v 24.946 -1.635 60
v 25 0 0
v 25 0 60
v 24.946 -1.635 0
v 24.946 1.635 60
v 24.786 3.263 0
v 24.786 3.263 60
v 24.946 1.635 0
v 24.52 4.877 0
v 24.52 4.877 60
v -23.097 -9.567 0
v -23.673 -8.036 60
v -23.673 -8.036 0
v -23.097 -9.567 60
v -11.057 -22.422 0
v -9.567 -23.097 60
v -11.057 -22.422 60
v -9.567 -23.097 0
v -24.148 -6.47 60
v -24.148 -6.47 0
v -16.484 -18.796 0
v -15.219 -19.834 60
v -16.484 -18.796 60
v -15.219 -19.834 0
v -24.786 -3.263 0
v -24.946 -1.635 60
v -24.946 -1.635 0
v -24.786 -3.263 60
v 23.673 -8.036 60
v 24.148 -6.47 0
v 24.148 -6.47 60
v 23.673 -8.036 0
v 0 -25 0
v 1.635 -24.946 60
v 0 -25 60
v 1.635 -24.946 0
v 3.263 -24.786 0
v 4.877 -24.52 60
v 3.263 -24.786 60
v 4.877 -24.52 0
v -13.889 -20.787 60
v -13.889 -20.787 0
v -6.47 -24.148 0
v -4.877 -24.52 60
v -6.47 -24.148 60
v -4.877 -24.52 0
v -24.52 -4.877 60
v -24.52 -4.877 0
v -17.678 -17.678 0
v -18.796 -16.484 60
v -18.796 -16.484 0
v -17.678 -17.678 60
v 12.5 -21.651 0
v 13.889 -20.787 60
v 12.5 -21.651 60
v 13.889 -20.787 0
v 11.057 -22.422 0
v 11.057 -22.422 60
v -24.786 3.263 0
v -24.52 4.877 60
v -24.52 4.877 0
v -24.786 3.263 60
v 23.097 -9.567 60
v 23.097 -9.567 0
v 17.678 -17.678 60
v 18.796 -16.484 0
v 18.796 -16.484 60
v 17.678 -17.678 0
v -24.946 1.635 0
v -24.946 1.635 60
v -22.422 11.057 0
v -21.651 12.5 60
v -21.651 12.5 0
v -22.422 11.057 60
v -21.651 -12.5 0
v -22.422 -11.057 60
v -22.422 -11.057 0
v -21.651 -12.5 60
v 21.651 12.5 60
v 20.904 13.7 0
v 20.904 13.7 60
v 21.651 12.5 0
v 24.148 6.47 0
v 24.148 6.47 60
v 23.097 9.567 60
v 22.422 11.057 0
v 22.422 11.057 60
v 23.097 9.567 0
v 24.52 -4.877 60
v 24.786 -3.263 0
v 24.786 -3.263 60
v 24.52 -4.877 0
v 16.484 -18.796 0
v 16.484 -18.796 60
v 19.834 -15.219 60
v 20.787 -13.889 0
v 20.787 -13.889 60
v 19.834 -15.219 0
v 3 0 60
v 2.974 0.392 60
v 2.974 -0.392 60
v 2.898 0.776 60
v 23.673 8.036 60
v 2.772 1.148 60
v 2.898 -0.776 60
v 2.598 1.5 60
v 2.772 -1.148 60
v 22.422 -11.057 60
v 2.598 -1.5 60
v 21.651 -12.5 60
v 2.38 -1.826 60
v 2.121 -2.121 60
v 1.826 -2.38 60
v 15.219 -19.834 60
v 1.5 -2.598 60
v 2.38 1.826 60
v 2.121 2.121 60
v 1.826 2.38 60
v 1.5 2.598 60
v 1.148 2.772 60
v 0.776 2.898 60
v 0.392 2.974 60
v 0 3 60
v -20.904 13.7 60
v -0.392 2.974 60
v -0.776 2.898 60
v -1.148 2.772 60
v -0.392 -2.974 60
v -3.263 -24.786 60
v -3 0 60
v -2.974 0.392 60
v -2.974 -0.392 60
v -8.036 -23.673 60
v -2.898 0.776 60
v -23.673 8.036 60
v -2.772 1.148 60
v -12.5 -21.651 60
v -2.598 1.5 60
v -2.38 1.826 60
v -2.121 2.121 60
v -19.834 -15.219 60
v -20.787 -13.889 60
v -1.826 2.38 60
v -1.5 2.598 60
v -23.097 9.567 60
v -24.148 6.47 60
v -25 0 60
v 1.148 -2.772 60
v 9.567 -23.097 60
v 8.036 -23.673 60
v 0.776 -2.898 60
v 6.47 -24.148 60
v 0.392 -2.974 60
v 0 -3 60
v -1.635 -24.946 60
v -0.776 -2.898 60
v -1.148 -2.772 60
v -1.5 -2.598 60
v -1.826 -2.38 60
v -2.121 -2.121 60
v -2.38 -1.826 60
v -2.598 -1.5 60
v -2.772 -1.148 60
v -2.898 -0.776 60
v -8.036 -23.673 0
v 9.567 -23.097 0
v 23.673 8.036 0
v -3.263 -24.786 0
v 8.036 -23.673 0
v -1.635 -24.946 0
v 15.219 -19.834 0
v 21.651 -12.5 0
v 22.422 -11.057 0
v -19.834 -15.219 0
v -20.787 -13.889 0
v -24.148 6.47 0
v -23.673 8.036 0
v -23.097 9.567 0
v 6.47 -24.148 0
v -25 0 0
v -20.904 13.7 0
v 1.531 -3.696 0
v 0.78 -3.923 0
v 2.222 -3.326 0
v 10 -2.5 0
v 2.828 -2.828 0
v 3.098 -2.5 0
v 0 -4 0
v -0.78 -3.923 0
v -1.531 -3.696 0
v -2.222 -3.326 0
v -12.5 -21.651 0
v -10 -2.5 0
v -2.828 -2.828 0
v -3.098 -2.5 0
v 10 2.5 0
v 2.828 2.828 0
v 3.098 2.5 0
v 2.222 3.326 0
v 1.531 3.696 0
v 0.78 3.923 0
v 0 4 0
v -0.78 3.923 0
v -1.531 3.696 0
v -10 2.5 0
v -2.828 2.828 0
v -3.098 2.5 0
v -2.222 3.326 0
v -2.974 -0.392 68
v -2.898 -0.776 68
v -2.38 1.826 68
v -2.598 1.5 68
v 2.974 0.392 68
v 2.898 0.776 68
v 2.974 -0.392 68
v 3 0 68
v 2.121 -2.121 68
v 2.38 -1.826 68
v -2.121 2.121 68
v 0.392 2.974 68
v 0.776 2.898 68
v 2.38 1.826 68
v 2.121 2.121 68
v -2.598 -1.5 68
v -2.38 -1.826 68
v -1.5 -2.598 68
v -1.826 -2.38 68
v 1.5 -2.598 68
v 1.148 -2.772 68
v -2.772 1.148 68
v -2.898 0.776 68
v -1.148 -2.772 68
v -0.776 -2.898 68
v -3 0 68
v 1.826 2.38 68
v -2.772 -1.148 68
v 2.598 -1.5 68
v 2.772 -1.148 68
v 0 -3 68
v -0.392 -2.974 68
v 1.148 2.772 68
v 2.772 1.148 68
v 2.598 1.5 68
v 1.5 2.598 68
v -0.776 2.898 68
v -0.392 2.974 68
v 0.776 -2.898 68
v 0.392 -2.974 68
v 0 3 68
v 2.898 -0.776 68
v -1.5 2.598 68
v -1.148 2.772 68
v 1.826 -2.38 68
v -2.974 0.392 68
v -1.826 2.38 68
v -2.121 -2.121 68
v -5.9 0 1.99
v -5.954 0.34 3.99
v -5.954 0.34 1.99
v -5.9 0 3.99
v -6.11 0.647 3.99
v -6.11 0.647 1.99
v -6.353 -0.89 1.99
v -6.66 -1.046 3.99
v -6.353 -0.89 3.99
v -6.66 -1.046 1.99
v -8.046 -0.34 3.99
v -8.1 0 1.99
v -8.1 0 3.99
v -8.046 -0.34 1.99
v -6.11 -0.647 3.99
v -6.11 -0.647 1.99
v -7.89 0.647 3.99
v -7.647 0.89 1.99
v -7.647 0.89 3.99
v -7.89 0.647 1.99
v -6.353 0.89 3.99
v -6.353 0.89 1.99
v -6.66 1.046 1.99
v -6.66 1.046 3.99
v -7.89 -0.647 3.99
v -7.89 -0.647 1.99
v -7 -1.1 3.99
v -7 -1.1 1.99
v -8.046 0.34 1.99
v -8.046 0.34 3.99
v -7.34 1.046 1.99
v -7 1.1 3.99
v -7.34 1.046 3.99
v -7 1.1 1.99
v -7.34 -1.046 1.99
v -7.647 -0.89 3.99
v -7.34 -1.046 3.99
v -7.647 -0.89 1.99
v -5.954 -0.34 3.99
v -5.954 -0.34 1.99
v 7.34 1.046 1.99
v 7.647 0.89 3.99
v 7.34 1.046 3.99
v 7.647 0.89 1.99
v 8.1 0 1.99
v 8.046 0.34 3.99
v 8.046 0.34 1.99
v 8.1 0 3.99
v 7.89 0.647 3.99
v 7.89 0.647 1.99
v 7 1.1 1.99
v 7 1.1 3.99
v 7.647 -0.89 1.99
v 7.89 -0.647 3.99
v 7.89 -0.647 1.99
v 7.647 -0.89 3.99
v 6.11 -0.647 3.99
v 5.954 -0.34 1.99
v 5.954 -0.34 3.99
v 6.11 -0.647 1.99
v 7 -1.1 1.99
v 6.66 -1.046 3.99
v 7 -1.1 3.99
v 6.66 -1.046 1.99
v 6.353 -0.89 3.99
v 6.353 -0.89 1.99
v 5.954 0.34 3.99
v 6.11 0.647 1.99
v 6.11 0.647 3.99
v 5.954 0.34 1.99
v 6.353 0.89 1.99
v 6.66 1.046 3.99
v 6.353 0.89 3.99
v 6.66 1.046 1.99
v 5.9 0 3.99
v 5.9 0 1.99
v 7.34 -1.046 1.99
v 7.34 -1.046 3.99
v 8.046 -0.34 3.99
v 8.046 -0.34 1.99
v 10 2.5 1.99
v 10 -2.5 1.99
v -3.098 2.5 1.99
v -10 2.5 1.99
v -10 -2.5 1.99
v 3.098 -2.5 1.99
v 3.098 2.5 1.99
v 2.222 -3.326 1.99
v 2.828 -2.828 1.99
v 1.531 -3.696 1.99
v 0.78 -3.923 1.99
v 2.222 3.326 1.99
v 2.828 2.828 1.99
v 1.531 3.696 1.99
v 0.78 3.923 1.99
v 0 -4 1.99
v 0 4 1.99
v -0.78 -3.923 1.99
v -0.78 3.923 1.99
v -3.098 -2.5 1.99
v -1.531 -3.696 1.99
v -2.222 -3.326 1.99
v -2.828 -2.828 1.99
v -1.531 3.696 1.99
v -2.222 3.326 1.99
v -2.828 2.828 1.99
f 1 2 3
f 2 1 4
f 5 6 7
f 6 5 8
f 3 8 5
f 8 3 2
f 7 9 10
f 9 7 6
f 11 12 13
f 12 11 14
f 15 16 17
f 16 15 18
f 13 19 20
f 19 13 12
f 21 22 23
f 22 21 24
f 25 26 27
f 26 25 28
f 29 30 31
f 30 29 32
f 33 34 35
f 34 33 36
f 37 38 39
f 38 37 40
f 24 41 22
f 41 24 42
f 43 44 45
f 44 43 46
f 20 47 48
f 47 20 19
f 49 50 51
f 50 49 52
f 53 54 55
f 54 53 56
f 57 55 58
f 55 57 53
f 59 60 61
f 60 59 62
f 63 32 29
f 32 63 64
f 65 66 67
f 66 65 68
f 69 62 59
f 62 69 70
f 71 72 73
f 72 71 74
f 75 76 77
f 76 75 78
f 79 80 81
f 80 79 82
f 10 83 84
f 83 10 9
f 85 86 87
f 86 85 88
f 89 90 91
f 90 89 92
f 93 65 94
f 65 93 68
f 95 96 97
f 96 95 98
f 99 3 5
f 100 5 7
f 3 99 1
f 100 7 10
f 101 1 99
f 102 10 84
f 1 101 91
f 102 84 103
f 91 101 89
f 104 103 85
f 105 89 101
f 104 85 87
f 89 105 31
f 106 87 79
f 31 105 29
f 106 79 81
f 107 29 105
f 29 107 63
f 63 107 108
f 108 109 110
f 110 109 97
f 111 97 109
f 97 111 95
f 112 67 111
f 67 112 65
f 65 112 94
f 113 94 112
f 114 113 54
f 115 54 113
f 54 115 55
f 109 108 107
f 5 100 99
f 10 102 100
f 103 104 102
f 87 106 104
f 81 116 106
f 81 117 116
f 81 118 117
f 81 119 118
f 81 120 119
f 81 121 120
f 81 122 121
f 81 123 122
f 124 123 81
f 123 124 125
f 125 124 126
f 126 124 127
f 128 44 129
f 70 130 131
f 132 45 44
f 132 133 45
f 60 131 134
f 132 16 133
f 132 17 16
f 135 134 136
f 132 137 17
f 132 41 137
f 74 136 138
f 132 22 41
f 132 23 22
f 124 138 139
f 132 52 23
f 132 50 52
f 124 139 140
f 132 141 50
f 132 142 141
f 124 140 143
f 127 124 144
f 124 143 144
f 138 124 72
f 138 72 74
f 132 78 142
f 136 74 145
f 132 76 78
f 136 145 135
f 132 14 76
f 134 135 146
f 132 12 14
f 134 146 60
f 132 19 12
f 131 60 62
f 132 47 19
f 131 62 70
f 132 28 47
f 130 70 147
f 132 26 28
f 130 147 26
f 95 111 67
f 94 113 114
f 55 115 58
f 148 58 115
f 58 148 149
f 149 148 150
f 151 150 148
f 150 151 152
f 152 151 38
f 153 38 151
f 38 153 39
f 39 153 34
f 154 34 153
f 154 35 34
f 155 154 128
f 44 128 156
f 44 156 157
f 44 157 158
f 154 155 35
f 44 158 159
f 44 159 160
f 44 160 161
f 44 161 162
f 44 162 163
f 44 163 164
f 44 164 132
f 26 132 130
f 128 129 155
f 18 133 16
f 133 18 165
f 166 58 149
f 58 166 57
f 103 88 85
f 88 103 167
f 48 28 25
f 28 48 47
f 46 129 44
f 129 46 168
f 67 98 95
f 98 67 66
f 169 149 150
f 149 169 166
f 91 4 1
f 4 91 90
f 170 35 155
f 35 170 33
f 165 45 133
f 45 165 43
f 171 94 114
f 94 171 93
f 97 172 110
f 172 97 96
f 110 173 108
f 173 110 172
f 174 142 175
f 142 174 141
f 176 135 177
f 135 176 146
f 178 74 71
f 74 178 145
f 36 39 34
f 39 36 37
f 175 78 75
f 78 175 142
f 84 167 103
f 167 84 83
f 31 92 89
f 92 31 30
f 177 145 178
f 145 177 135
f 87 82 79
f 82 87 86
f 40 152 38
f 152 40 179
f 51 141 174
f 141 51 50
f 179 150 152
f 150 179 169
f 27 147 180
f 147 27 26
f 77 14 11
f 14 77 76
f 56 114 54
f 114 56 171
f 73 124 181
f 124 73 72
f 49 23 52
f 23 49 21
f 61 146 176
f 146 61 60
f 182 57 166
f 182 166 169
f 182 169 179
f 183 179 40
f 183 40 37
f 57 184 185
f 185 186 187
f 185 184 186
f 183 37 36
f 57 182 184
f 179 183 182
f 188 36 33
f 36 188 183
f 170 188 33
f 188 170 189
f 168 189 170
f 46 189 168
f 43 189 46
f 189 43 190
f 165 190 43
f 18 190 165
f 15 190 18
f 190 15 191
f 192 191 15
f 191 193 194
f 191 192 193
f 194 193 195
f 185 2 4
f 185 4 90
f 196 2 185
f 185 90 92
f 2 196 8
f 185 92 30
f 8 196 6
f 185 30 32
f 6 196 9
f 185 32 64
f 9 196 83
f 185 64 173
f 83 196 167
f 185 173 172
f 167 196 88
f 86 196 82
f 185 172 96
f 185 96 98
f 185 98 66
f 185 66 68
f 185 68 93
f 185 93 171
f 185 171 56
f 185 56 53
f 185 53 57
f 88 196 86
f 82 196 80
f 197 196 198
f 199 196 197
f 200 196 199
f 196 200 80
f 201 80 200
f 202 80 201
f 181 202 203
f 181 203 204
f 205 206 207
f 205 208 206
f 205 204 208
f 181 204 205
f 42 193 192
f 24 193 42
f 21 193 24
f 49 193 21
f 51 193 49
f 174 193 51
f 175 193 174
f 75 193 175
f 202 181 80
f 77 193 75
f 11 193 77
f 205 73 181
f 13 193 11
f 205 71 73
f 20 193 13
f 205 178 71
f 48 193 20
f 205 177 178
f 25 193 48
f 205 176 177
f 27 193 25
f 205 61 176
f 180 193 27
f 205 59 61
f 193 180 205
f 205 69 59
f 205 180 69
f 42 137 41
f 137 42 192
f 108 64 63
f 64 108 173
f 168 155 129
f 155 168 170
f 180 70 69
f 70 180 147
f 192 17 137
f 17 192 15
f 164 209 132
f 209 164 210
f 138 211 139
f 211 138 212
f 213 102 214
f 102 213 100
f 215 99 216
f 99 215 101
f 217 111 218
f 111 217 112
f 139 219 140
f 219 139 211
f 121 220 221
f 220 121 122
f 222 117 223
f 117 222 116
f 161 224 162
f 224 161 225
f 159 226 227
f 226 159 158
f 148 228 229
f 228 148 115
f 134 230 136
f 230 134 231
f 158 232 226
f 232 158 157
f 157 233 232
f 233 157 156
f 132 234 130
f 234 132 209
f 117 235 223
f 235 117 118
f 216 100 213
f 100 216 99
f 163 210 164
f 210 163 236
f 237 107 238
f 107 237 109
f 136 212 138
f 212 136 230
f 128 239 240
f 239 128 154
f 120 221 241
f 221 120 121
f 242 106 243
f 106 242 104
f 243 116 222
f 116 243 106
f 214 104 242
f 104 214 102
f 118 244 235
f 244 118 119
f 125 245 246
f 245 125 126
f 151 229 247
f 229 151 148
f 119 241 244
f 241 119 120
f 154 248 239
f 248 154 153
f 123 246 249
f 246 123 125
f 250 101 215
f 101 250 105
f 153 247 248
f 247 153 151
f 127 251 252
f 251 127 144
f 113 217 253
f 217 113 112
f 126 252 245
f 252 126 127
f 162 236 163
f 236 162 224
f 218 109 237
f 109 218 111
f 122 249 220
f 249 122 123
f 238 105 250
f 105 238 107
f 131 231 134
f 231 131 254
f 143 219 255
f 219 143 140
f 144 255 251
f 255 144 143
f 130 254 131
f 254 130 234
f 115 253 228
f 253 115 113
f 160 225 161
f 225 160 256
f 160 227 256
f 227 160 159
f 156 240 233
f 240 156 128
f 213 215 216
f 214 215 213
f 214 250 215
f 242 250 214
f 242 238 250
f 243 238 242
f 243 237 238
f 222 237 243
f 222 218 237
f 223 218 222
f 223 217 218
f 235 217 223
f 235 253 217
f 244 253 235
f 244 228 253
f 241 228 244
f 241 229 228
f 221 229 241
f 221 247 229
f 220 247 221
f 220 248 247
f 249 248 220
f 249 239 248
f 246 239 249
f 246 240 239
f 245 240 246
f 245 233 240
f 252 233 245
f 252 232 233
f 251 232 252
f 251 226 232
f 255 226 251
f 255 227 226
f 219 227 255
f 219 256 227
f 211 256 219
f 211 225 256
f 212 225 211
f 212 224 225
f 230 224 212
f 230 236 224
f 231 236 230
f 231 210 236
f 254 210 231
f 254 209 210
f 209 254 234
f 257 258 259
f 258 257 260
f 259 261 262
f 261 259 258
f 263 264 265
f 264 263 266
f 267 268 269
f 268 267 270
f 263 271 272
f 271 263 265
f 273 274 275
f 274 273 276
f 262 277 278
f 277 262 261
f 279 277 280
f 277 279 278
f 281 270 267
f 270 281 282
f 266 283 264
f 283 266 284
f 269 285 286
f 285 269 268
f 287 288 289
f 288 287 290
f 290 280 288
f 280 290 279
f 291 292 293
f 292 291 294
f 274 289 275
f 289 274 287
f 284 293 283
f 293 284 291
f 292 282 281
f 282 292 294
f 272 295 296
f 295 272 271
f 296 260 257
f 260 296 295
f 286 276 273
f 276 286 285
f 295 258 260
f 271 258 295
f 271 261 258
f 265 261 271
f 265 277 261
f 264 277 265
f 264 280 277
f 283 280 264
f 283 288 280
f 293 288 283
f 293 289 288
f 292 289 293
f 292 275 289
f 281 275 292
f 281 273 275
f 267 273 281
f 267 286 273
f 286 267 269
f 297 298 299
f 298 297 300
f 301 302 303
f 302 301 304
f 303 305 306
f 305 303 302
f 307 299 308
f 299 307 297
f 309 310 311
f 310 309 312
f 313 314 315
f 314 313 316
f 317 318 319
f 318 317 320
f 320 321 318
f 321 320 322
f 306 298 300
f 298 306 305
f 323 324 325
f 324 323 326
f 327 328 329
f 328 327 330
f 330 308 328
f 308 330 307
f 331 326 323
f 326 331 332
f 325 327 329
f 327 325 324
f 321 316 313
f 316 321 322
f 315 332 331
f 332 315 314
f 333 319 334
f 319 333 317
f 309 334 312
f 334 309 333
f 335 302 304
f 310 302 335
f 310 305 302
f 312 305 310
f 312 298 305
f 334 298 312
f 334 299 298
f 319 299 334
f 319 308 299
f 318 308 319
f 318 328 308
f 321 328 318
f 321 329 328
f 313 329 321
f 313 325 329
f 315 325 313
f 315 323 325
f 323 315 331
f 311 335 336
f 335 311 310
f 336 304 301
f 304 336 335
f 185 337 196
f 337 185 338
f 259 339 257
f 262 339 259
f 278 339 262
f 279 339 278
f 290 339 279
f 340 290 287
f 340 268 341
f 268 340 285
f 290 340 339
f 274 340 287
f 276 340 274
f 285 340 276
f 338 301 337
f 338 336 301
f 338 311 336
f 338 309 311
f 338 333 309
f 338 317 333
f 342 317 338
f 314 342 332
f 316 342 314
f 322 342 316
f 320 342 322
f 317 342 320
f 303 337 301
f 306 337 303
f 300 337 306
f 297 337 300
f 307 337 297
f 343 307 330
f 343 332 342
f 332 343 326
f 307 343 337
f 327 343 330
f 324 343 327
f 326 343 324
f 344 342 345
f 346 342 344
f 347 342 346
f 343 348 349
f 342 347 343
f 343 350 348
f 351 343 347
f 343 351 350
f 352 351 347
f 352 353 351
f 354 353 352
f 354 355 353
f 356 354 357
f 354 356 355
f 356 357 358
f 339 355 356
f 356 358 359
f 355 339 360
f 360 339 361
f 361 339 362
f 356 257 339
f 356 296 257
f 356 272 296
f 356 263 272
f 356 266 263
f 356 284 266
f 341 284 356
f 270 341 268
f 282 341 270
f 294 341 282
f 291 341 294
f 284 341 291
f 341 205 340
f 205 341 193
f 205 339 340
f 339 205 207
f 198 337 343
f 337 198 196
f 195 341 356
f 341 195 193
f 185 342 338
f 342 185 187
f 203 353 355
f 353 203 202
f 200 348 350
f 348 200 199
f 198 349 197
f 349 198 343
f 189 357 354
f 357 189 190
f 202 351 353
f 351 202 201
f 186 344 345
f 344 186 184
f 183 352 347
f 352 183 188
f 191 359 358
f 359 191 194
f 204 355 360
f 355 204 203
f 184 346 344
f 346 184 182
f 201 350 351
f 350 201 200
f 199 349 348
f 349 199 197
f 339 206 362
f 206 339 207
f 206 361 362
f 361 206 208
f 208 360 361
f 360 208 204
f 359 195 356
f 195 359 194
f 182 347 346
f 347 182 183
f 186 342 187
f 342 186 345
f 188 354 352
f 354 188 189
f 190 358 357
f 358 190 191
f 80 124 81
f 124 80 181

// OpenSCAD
// file: common.scad
// common.scad — every dimension in the feeder lives here.
// Change a value, re-run ../check.sh, and every part regrows together.

/* ---------- Printer envelope ---------- */
bed_x = 220;
bed_y = 220;
bed_z = 250;

/* ---------- Material and process ---------- */
wall      = 2.0;    // nominal wall thickness (5 perimeters at 0.4 nozzle)
fit_slide = 0.30;   // clearance for parts that must move against each other
fit_press = 0.15;   // clearance for parts pressed together
$fn       = 96;

/* ---------- Fasteners ---------- */
m3_free = 3.4;      // M3 clearance hole
m3_tap  = 2.8;      // M3 self-tapping into plastic
m4_free = 4.5;

/* ---------- Load cells (VERIFY against the cells you actually buy) ----------
   Figures below are for the common YZC-133 straight bar. Bolt spacing varies
   between suppliers; measure yours before printing the base or the platform. */
cell_l            = 80;
cell_w            = 12.7;
cell_h            = 12.7;
cell_bolt_spacing = 15;   // centre-to-centre, at each end
cell_gap          = 3;    // spacer thickness — the beam MUST be free to flex

/* ---------- Food model ---------- */
kibble_density = 0.40;   // g/cm^3, dry kibble bulk density

/* ---------- Hopper ---------- */
hopper_volume_l = 2.0;
hopper_mouth    = 140;   // inner, square, at the top
hopper_throat   = 55;    // inner, square, at the bottom

// Square frustum volume: V = h/3 * (A1 + A2 + sqrt(A1*A2))
// For squares sqrt(A1*A2) collapses to mouth*throat, so height is exact:
hopper_h = 3 * hopper_volume_l * 1000000 /
           (hopper_mouth*hopper_mouth + hopper_throat*hopper_throat +
            hopper_mouth*hopper_throat);

hopper_run        = (hopper_mouth - hopper_throat) / 2;
hopper_wall_angle = atan(hopper_h / hopper_run);   // from horizontal
hopper_taper_rate = (hopper_mouth - hopper_throat) / hopper_h;
hopper_capacity_g = hopper_volume_l * 1000 * kibble_density;

/* ---------- Drum valve ---------- */
drum_dia       = 50;
drum_len       = 60;
drum_clearance = 0.4;                      // radial
drum_bore      = drum_dia + 2*drum_clearance;
pocket_depth   = 11.3;                     // segment depth of the scoop
shaft_dia      = 6;
shaft_len      = 8;

// Circular-segment maths. OpenSCAD trig is in DEGREES; the segment area
// formula needs the angle in RADIANS, hence the two forms below.
drum_r          = drum_dia / 2;
pocket_theta    = 2 * acos(1 - pocket_depth/drum_r);        // degrees
pocket_theta_r  = pocket_theta * PI / 180;                  // radians
pocket_area     = drum_r*drum_r/2 * (pocket_theta_r - sin(pocket_theta));
pocket_volume   = pocket_area * drum_len;                   // mm^3
sweep_grams     = pocket_volume / 1000 * kibble_density;    // DERIVED, not assumed

/* ---------- Valve housing ---------- */
housing_x = drum_len + 4*wall;      // along the drum axis
housing_y = drum_bore + 4*wall;
housing_z = drum_bore + 4*wall;
outlet_x  = 45;
outlet_y  = 45;

/* ---------- Chute ---------- */
chute_forward = 70;    // how far forward of the tower the food lands
chute_drop    = 90;    // vertical fall from valve outlet to chute exit
chute_exit    = 40;
chute_clear   = 40;    // exit height above the bowl rim — impulse, not load

/* ---------- Bowl and platform ---------- */
bowl_dia     = 140;    // the BOUGHT stainless/ceramic bowl
platform_dia = 150;
platform_t   = 5;
ring_w       = 3;
ring_h       = 8;
bowl_gap     = 6;      // air on every side — the isolation gap

/* ---------- Base and tower ---------- */
base_size = 190;
base_t    = 6;
bay_h     = 28;        // electronics bay height
tower_w   = 90;
tower_d   = 70;
tower_h   = 150;

/* ---------- Head ---------- */
head_tilt   = 30;      // camera, degrees down from horizontal
cam_pcb     = [40, 40, 1.6];
sr04_dia    = 16;
sr04_pitch  = 26;      // centre-to-centre of the two transducers

/* ---------- Derived overall ---------- */
total_h = base_t + bay_h + tower_h + housing_z + hopper_h;

/* ---------- Assertions: the things that silently ruin a print ---------- */
assert(hopper_wall_angle >= 60,
       str("Hopper wall ", hopper_wall_angle, " deg is below 60 - kibble will bridge"));
assert(hopper_h + 2*wall <= bed_z,
       str("Hopper ", hopper_h, " mm exceeds bed Z ", bed_z));
assert(hopper_mouth + 2*wall <= bed_x,
       "Hopper mouth exceeds bed X");
assert(base_size <= bed_x && base_size <= bed_y,
       "Base exceeds bed footprint");
assert(platform_dia <= bed_x, "Bowl platform exceeds bed X");
assert(drum_clearance > 0, "Drum clearance must be positive or the drum seizes");
assert(drum_bore > drum_dia, "Drum bore must exceed drum diameter");
assert(pocket_depth < drum_r,
       "Pocket deeper than the drum radius - the scoop would cut through the axis");
assert(sweep_grams > 6 && sweep_grams < 10,
       str("Sweep delivers ", sweep_grams, " g - outside the 6-10 g design window"));
assert(bowl_gap > 0, "Bowl isolation gap must be positive");
assert(cell_gap > 0, "Load cell needs a flex gap or it reads nothing");
assert(chute_forward + 40 <= bed_y,
       "Bowl arm exceeds bed Y - split it or shorten chute_forward");

/* ---------- Shared geometry ---------- */
// A square frustum, bottom face on the XY plane, centred on Z.
module frustum(bottom, top, h) {
  linear_extrude(height = h, scale = top/bottom)
    square([bottom, bottom], center = true);
}

// A rectangular tube used for the labyrinth lip on the lid and hopper mouth.
module lip(inner, thickness, h) {
  difference() {
    cube([inner + 2*thickness, inner + 2*thickness, h], center = true);
    cube([inner, inner, h + 1], center = true);
  }
}

// Four bolt holes on a square pattern.
module bolt_square(spacing, dia, h) {
  for (i = [0:3])
    rotate([0, 0, 90*i])
      translate([spacing/2, spacing/2, 0])
        cylinder(d = dia, h = h, center = true, $fn = 24);
}

// The cantilever footprint a load cell bolts into: two holes plus a relief slot.
module cell_mount(dia = m3_tap, h = 10) {
  for (y = [-cell_bolt_spacing/2, cell_bolt_spacing/2])
    translate([0, y, 0]) cylinder(d = dia, h = h, center = true, $fn = 24);
}

echo(str("hopper_h = ", hopper_h, " mm"));
echo(str("hopper wall angle = ", hopper_wall_angle, " deg"));
echo(str("hopper capacity = ", hopper_capacity_g, " g"));
echo(str("sweep = ", sweep_grams, " g"));
echo(str("total height = ", total_h, " mm"));
// main file
include <common.scad>

horn_l = 20;    // servo horn arm length
horn_w = 5;
horn_t = 2;

module drum() {
  difference() {
    union() {
      // Drum body. Axis along Z here for printing; it mounts along X.
      cylinder(d = drum_dia, h = drum_len);
      // Idler shaft stub (far end from the servo).
      translate([0, 0, drum_len]) cylinder(d = shaft_dia, h = shaft_len, $fn = 48);
    }

    // The scoop pocket: a circular segment of depth pocket_depth, running the
    // full length. Everything with y > r - pocket_depth is removed.
    translate([-drum_dia/2 - 1, drum_r - pocket_depth, -1])
      cube([drum_dia + 2, pocket_depth + 2, drum_len + 2]);

    // Servo horn recess in the driven face, plus two M2 screw holes.
    translate([0, 0, -0.01]) {
      cube([horn_l, horn_w, 2*horn_t], center = true);
      cylinder(d = 8, h = 2*horn_t, center = true, $fn = 32);
      for (x = [-horn_l/2 + 3, horn_l/2 - 3])
        translate([x, 0, 0]) cylinder(d = 2.2, h = 4*horn_t, center = true, $fn = 20);
    }
  }
}

drum();
